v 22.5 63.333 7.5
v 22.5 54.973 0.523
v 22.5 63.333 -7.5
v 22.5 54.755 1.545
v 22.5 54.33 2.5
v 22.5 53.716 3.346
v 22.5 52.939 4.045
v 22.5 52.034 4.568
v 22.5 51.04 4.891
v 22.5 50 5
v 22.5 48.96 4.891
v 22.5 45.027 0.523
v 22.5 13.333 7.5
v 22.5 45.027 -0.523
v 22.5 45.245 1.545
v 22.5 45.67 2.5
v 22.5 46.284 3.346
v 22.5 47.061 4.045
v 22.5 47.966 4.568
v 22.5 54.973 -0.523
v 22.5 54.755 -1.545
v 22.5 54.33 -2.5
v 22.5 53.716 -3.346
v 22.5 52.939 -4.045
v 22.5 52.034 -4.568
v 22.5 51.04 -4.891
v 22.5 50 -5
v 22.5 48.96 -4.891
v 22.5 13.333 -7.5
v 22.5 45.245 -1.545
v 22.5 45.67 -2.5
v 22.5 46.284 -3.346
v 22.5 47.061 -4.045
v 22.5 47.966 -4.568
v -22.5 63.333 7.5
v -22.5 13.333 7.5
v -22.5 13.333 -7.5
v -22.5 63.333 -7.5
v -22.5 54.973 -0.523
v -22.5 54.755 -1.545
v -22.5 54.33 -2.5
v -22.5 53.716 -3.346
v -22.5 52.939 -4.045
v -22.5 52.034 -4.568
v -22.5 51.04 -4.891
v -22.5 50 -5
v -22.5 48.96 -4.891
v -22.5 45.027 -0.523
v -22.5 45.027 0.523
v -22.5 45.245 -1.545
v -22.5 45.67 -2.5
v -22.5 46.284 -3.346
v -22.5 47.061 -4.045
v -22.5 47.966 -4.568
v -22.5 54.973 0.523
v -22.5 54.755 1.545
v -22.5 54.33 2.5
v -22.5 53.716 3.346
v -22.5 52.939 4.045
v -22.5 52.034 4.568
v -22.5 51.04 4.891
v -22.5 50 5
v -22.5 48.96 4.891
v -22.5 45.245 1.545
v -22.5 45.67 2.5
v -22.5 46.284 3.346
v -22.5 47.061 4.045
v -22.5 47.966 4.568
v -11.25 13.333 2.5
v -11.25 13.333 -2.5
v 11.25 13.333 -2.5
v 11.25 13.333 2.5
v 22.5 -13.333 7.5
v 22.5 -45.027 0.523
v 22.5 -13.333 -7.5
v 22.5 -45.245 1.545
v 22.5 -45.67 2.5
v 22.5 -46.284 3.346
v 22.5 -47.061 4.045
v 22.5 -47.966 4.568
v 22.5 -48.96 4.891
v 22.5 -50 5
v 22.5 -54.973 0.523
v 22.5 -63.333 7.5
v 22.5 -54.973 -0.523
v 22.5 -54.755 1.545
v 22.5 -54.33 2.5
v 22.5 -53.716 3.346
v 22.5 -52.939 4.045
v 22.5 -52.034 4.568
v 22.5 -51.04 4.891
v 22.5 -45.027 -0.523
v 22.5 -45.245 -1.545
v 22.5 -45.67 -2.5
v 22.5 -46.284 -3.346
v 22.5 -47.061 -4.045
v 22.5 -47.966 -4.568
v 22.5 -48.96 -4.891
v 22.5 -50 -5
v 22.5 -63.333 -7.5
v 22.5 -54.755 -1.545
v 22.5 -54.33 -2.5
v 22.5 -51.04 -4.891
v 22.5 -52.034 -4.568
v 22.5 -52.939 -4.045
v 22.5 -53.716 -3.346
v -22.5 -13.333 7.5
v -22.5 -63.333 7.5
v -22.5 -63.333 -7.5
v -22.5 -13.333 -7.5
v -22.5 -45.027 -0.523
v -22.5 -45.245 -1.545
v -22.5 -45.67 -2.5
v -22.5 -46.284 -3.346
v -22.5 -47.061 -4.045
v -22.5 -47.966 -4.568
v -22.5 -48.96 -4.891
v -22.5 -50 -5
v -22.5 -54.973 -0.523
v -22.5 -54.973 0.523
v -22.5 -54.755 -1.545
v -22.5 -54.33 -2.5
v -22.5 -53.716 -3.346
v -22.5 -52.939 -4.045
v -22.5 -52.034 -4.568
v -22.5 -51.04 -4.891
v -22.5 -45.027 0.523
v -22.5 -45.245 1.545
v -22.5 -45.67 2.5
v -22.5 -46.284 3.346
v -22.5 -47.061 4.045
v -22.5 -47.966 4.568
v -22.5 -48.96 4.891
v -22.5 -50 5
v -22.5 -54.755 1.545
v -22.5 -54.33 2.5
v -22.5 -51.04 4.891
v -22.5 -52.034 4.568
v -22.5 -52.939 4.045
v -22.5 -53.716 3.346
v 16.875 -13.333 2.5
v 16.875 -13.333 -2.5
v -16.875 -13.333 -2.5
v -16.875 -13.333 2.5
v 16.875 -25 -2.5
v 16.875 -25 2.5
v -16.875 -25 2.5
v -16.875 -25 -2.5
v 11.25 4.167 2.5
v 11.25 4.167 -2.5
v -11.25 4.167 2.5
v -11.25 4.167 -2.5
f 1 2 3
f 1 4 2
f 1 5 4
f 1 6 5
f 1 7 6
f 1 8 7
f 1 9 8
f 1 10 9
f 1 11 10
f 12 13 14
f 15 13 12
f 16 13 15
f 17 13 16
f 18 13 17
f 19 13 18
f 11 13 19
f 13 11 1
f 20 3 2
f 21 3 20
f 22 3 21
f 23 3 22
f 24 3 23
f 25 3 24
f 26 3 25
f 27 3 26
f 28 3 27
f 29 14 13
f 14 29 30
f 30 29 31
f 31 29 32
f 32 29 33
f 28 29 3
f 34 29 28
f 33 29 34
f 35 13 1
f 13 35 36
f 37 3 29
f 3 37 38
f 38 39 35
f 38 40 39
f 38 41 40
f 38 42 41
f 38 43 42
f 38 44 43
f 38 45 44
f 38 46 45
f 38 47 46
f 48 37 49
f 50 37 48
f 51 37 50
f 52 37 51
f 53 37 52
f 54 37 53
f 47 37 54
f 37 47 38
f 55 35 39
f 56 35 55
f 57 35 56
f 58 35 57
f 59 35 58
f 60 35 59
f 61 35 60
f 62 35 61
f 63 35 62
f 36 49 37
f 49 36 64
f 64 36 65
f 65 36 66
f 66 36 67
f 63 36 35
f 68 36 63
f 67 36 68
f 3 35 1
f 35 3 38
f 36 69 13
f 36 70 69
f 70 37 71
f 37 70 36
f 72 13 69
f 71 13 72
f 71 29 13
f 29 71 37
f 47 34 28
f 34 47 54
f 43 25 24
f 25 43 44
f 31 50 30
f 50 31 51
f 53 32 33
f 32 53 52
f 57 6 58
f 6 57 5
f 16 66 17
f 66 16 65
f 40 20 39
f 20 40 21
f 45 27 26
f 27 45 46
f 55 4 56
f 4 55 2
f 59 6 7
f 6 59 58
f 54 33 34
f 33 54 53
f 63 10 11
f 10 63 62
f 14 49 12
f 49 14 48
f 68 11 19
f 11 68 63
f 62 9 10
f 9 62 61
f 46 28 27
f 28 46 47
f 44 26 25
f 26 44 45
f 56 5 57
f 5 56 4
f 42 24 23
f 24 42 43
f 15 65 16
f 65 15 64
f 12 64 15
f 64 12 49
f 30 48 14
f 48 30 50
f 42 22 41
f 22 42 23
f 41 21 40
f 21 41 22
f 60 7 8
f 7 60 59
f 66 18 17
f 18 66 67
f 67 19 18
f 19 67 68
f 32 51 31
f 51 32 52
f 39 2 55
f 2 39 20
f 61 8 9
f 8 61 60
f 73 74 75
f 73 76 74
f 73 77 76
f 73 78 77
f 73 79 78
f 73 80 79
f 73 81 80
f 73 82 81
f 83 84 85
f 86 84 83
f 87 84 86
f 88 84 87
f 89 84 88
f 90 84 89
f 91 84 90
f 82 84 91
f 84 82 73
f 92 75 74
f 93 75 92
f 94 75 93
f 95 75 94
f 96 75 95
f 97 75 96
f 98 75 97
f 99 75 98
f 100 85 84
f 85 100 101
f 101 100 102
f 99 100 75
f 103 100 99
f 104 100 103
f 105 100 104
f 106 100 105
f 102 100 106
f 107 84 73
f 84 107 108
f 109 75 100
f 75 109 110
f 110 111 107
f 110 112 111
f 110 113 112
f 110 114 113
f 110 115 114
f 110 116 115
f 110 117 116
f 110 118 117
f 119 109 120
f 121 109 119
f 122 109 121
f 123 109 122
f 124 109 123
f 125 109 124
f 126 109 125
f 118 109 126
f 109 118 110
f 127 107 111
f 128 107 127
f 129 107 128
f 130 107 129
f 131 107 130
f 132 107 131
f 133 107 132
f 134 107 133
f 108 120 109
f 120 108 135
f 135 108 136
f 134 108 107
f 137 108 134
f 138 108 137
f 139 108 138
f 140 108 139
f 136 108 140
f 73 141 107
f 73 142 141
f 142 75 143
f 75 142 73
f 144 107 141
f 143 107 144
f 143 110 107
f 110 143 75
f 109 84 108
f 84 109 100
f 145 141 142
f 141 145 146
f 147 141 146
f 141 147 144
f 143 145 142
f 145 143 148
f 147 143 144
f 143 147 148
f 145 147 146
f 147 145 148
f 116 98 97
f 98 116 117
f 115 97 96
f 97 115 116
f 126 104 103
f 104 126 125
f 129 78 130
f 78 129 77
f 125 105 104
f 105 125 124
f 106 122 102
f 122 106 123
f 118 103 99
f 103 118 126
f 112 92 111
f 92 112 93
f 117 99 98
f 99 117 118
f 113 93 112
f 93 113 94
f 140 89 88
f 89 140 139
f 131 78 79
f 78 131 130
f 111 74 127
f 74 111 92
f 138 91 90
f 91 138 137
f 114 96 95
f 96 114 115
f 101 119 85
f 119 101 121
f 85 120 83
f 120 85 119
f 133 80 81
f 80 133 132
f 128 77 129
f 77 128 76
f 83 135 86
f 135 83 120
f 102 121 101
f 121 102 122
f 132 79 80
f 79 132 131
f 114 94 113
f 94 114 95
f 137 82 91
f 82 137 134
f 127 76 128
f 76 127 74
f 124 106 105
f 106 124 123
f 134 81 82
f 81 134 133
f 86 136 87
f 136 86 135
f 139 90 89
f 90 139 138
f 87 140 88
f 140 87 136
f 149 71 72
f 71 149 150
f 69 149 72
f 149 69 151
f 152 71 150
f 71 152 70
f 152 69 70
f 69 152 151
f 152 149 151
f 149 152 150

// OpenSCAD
$fs = 0.01;


laser_length=30;
laser_diam=10;

laser_offset=100; // 10 cm
block_length=laser_offset/2;
block_width=laser_length*1.5;
block_height=laser_diam*1.5;

laser_hole_length=block_width*1.1;

tongue_length=block_length/3;
tongue_width=block_width*.5;
tongue_height=block_height/3;

block_translate_along_length=tongue_length*.8;

tongue_translate_along_length=tongue_length/2;


difference() {
// big block
translate([-block_width/2,block_translate_along_length,-block_height/2])
cube(size=[block_width,block_length,block_height]);

translate([-laser_hole_length/2,50,])
rotate([0,90,0])
 cylinder(h=laser_hole_length, r1=laser_diam/2, r2=laser_diam/2);
}

// tongue
translate([-tongue_width/2,tongue_translate_along_length/2,-tongue_height/2])
cube(size=[tongue_width,tongue_length,tongue_height]);


difference() {
// big block
    
    difference() {
translate([-block_width/2,-(block_translate_along_length+block_length),-block_height/2])
cube(size=[block_width,block_length,block_height]);

// anti-tongue
        
       translate([-tongue_width*1.5/2,-tongue_length*1.5,-tongue_height/2])
cube(size=[tongue_width*1.5,tongue_length,tongue_height]); 
        
    }
    
    
translate([-laser_hole_length/2,-50,])
rotate([0,90,0])
 cylinder(h=laser_hole_length, r1=laser_diam/2, r2=laser_diam/2);
}
